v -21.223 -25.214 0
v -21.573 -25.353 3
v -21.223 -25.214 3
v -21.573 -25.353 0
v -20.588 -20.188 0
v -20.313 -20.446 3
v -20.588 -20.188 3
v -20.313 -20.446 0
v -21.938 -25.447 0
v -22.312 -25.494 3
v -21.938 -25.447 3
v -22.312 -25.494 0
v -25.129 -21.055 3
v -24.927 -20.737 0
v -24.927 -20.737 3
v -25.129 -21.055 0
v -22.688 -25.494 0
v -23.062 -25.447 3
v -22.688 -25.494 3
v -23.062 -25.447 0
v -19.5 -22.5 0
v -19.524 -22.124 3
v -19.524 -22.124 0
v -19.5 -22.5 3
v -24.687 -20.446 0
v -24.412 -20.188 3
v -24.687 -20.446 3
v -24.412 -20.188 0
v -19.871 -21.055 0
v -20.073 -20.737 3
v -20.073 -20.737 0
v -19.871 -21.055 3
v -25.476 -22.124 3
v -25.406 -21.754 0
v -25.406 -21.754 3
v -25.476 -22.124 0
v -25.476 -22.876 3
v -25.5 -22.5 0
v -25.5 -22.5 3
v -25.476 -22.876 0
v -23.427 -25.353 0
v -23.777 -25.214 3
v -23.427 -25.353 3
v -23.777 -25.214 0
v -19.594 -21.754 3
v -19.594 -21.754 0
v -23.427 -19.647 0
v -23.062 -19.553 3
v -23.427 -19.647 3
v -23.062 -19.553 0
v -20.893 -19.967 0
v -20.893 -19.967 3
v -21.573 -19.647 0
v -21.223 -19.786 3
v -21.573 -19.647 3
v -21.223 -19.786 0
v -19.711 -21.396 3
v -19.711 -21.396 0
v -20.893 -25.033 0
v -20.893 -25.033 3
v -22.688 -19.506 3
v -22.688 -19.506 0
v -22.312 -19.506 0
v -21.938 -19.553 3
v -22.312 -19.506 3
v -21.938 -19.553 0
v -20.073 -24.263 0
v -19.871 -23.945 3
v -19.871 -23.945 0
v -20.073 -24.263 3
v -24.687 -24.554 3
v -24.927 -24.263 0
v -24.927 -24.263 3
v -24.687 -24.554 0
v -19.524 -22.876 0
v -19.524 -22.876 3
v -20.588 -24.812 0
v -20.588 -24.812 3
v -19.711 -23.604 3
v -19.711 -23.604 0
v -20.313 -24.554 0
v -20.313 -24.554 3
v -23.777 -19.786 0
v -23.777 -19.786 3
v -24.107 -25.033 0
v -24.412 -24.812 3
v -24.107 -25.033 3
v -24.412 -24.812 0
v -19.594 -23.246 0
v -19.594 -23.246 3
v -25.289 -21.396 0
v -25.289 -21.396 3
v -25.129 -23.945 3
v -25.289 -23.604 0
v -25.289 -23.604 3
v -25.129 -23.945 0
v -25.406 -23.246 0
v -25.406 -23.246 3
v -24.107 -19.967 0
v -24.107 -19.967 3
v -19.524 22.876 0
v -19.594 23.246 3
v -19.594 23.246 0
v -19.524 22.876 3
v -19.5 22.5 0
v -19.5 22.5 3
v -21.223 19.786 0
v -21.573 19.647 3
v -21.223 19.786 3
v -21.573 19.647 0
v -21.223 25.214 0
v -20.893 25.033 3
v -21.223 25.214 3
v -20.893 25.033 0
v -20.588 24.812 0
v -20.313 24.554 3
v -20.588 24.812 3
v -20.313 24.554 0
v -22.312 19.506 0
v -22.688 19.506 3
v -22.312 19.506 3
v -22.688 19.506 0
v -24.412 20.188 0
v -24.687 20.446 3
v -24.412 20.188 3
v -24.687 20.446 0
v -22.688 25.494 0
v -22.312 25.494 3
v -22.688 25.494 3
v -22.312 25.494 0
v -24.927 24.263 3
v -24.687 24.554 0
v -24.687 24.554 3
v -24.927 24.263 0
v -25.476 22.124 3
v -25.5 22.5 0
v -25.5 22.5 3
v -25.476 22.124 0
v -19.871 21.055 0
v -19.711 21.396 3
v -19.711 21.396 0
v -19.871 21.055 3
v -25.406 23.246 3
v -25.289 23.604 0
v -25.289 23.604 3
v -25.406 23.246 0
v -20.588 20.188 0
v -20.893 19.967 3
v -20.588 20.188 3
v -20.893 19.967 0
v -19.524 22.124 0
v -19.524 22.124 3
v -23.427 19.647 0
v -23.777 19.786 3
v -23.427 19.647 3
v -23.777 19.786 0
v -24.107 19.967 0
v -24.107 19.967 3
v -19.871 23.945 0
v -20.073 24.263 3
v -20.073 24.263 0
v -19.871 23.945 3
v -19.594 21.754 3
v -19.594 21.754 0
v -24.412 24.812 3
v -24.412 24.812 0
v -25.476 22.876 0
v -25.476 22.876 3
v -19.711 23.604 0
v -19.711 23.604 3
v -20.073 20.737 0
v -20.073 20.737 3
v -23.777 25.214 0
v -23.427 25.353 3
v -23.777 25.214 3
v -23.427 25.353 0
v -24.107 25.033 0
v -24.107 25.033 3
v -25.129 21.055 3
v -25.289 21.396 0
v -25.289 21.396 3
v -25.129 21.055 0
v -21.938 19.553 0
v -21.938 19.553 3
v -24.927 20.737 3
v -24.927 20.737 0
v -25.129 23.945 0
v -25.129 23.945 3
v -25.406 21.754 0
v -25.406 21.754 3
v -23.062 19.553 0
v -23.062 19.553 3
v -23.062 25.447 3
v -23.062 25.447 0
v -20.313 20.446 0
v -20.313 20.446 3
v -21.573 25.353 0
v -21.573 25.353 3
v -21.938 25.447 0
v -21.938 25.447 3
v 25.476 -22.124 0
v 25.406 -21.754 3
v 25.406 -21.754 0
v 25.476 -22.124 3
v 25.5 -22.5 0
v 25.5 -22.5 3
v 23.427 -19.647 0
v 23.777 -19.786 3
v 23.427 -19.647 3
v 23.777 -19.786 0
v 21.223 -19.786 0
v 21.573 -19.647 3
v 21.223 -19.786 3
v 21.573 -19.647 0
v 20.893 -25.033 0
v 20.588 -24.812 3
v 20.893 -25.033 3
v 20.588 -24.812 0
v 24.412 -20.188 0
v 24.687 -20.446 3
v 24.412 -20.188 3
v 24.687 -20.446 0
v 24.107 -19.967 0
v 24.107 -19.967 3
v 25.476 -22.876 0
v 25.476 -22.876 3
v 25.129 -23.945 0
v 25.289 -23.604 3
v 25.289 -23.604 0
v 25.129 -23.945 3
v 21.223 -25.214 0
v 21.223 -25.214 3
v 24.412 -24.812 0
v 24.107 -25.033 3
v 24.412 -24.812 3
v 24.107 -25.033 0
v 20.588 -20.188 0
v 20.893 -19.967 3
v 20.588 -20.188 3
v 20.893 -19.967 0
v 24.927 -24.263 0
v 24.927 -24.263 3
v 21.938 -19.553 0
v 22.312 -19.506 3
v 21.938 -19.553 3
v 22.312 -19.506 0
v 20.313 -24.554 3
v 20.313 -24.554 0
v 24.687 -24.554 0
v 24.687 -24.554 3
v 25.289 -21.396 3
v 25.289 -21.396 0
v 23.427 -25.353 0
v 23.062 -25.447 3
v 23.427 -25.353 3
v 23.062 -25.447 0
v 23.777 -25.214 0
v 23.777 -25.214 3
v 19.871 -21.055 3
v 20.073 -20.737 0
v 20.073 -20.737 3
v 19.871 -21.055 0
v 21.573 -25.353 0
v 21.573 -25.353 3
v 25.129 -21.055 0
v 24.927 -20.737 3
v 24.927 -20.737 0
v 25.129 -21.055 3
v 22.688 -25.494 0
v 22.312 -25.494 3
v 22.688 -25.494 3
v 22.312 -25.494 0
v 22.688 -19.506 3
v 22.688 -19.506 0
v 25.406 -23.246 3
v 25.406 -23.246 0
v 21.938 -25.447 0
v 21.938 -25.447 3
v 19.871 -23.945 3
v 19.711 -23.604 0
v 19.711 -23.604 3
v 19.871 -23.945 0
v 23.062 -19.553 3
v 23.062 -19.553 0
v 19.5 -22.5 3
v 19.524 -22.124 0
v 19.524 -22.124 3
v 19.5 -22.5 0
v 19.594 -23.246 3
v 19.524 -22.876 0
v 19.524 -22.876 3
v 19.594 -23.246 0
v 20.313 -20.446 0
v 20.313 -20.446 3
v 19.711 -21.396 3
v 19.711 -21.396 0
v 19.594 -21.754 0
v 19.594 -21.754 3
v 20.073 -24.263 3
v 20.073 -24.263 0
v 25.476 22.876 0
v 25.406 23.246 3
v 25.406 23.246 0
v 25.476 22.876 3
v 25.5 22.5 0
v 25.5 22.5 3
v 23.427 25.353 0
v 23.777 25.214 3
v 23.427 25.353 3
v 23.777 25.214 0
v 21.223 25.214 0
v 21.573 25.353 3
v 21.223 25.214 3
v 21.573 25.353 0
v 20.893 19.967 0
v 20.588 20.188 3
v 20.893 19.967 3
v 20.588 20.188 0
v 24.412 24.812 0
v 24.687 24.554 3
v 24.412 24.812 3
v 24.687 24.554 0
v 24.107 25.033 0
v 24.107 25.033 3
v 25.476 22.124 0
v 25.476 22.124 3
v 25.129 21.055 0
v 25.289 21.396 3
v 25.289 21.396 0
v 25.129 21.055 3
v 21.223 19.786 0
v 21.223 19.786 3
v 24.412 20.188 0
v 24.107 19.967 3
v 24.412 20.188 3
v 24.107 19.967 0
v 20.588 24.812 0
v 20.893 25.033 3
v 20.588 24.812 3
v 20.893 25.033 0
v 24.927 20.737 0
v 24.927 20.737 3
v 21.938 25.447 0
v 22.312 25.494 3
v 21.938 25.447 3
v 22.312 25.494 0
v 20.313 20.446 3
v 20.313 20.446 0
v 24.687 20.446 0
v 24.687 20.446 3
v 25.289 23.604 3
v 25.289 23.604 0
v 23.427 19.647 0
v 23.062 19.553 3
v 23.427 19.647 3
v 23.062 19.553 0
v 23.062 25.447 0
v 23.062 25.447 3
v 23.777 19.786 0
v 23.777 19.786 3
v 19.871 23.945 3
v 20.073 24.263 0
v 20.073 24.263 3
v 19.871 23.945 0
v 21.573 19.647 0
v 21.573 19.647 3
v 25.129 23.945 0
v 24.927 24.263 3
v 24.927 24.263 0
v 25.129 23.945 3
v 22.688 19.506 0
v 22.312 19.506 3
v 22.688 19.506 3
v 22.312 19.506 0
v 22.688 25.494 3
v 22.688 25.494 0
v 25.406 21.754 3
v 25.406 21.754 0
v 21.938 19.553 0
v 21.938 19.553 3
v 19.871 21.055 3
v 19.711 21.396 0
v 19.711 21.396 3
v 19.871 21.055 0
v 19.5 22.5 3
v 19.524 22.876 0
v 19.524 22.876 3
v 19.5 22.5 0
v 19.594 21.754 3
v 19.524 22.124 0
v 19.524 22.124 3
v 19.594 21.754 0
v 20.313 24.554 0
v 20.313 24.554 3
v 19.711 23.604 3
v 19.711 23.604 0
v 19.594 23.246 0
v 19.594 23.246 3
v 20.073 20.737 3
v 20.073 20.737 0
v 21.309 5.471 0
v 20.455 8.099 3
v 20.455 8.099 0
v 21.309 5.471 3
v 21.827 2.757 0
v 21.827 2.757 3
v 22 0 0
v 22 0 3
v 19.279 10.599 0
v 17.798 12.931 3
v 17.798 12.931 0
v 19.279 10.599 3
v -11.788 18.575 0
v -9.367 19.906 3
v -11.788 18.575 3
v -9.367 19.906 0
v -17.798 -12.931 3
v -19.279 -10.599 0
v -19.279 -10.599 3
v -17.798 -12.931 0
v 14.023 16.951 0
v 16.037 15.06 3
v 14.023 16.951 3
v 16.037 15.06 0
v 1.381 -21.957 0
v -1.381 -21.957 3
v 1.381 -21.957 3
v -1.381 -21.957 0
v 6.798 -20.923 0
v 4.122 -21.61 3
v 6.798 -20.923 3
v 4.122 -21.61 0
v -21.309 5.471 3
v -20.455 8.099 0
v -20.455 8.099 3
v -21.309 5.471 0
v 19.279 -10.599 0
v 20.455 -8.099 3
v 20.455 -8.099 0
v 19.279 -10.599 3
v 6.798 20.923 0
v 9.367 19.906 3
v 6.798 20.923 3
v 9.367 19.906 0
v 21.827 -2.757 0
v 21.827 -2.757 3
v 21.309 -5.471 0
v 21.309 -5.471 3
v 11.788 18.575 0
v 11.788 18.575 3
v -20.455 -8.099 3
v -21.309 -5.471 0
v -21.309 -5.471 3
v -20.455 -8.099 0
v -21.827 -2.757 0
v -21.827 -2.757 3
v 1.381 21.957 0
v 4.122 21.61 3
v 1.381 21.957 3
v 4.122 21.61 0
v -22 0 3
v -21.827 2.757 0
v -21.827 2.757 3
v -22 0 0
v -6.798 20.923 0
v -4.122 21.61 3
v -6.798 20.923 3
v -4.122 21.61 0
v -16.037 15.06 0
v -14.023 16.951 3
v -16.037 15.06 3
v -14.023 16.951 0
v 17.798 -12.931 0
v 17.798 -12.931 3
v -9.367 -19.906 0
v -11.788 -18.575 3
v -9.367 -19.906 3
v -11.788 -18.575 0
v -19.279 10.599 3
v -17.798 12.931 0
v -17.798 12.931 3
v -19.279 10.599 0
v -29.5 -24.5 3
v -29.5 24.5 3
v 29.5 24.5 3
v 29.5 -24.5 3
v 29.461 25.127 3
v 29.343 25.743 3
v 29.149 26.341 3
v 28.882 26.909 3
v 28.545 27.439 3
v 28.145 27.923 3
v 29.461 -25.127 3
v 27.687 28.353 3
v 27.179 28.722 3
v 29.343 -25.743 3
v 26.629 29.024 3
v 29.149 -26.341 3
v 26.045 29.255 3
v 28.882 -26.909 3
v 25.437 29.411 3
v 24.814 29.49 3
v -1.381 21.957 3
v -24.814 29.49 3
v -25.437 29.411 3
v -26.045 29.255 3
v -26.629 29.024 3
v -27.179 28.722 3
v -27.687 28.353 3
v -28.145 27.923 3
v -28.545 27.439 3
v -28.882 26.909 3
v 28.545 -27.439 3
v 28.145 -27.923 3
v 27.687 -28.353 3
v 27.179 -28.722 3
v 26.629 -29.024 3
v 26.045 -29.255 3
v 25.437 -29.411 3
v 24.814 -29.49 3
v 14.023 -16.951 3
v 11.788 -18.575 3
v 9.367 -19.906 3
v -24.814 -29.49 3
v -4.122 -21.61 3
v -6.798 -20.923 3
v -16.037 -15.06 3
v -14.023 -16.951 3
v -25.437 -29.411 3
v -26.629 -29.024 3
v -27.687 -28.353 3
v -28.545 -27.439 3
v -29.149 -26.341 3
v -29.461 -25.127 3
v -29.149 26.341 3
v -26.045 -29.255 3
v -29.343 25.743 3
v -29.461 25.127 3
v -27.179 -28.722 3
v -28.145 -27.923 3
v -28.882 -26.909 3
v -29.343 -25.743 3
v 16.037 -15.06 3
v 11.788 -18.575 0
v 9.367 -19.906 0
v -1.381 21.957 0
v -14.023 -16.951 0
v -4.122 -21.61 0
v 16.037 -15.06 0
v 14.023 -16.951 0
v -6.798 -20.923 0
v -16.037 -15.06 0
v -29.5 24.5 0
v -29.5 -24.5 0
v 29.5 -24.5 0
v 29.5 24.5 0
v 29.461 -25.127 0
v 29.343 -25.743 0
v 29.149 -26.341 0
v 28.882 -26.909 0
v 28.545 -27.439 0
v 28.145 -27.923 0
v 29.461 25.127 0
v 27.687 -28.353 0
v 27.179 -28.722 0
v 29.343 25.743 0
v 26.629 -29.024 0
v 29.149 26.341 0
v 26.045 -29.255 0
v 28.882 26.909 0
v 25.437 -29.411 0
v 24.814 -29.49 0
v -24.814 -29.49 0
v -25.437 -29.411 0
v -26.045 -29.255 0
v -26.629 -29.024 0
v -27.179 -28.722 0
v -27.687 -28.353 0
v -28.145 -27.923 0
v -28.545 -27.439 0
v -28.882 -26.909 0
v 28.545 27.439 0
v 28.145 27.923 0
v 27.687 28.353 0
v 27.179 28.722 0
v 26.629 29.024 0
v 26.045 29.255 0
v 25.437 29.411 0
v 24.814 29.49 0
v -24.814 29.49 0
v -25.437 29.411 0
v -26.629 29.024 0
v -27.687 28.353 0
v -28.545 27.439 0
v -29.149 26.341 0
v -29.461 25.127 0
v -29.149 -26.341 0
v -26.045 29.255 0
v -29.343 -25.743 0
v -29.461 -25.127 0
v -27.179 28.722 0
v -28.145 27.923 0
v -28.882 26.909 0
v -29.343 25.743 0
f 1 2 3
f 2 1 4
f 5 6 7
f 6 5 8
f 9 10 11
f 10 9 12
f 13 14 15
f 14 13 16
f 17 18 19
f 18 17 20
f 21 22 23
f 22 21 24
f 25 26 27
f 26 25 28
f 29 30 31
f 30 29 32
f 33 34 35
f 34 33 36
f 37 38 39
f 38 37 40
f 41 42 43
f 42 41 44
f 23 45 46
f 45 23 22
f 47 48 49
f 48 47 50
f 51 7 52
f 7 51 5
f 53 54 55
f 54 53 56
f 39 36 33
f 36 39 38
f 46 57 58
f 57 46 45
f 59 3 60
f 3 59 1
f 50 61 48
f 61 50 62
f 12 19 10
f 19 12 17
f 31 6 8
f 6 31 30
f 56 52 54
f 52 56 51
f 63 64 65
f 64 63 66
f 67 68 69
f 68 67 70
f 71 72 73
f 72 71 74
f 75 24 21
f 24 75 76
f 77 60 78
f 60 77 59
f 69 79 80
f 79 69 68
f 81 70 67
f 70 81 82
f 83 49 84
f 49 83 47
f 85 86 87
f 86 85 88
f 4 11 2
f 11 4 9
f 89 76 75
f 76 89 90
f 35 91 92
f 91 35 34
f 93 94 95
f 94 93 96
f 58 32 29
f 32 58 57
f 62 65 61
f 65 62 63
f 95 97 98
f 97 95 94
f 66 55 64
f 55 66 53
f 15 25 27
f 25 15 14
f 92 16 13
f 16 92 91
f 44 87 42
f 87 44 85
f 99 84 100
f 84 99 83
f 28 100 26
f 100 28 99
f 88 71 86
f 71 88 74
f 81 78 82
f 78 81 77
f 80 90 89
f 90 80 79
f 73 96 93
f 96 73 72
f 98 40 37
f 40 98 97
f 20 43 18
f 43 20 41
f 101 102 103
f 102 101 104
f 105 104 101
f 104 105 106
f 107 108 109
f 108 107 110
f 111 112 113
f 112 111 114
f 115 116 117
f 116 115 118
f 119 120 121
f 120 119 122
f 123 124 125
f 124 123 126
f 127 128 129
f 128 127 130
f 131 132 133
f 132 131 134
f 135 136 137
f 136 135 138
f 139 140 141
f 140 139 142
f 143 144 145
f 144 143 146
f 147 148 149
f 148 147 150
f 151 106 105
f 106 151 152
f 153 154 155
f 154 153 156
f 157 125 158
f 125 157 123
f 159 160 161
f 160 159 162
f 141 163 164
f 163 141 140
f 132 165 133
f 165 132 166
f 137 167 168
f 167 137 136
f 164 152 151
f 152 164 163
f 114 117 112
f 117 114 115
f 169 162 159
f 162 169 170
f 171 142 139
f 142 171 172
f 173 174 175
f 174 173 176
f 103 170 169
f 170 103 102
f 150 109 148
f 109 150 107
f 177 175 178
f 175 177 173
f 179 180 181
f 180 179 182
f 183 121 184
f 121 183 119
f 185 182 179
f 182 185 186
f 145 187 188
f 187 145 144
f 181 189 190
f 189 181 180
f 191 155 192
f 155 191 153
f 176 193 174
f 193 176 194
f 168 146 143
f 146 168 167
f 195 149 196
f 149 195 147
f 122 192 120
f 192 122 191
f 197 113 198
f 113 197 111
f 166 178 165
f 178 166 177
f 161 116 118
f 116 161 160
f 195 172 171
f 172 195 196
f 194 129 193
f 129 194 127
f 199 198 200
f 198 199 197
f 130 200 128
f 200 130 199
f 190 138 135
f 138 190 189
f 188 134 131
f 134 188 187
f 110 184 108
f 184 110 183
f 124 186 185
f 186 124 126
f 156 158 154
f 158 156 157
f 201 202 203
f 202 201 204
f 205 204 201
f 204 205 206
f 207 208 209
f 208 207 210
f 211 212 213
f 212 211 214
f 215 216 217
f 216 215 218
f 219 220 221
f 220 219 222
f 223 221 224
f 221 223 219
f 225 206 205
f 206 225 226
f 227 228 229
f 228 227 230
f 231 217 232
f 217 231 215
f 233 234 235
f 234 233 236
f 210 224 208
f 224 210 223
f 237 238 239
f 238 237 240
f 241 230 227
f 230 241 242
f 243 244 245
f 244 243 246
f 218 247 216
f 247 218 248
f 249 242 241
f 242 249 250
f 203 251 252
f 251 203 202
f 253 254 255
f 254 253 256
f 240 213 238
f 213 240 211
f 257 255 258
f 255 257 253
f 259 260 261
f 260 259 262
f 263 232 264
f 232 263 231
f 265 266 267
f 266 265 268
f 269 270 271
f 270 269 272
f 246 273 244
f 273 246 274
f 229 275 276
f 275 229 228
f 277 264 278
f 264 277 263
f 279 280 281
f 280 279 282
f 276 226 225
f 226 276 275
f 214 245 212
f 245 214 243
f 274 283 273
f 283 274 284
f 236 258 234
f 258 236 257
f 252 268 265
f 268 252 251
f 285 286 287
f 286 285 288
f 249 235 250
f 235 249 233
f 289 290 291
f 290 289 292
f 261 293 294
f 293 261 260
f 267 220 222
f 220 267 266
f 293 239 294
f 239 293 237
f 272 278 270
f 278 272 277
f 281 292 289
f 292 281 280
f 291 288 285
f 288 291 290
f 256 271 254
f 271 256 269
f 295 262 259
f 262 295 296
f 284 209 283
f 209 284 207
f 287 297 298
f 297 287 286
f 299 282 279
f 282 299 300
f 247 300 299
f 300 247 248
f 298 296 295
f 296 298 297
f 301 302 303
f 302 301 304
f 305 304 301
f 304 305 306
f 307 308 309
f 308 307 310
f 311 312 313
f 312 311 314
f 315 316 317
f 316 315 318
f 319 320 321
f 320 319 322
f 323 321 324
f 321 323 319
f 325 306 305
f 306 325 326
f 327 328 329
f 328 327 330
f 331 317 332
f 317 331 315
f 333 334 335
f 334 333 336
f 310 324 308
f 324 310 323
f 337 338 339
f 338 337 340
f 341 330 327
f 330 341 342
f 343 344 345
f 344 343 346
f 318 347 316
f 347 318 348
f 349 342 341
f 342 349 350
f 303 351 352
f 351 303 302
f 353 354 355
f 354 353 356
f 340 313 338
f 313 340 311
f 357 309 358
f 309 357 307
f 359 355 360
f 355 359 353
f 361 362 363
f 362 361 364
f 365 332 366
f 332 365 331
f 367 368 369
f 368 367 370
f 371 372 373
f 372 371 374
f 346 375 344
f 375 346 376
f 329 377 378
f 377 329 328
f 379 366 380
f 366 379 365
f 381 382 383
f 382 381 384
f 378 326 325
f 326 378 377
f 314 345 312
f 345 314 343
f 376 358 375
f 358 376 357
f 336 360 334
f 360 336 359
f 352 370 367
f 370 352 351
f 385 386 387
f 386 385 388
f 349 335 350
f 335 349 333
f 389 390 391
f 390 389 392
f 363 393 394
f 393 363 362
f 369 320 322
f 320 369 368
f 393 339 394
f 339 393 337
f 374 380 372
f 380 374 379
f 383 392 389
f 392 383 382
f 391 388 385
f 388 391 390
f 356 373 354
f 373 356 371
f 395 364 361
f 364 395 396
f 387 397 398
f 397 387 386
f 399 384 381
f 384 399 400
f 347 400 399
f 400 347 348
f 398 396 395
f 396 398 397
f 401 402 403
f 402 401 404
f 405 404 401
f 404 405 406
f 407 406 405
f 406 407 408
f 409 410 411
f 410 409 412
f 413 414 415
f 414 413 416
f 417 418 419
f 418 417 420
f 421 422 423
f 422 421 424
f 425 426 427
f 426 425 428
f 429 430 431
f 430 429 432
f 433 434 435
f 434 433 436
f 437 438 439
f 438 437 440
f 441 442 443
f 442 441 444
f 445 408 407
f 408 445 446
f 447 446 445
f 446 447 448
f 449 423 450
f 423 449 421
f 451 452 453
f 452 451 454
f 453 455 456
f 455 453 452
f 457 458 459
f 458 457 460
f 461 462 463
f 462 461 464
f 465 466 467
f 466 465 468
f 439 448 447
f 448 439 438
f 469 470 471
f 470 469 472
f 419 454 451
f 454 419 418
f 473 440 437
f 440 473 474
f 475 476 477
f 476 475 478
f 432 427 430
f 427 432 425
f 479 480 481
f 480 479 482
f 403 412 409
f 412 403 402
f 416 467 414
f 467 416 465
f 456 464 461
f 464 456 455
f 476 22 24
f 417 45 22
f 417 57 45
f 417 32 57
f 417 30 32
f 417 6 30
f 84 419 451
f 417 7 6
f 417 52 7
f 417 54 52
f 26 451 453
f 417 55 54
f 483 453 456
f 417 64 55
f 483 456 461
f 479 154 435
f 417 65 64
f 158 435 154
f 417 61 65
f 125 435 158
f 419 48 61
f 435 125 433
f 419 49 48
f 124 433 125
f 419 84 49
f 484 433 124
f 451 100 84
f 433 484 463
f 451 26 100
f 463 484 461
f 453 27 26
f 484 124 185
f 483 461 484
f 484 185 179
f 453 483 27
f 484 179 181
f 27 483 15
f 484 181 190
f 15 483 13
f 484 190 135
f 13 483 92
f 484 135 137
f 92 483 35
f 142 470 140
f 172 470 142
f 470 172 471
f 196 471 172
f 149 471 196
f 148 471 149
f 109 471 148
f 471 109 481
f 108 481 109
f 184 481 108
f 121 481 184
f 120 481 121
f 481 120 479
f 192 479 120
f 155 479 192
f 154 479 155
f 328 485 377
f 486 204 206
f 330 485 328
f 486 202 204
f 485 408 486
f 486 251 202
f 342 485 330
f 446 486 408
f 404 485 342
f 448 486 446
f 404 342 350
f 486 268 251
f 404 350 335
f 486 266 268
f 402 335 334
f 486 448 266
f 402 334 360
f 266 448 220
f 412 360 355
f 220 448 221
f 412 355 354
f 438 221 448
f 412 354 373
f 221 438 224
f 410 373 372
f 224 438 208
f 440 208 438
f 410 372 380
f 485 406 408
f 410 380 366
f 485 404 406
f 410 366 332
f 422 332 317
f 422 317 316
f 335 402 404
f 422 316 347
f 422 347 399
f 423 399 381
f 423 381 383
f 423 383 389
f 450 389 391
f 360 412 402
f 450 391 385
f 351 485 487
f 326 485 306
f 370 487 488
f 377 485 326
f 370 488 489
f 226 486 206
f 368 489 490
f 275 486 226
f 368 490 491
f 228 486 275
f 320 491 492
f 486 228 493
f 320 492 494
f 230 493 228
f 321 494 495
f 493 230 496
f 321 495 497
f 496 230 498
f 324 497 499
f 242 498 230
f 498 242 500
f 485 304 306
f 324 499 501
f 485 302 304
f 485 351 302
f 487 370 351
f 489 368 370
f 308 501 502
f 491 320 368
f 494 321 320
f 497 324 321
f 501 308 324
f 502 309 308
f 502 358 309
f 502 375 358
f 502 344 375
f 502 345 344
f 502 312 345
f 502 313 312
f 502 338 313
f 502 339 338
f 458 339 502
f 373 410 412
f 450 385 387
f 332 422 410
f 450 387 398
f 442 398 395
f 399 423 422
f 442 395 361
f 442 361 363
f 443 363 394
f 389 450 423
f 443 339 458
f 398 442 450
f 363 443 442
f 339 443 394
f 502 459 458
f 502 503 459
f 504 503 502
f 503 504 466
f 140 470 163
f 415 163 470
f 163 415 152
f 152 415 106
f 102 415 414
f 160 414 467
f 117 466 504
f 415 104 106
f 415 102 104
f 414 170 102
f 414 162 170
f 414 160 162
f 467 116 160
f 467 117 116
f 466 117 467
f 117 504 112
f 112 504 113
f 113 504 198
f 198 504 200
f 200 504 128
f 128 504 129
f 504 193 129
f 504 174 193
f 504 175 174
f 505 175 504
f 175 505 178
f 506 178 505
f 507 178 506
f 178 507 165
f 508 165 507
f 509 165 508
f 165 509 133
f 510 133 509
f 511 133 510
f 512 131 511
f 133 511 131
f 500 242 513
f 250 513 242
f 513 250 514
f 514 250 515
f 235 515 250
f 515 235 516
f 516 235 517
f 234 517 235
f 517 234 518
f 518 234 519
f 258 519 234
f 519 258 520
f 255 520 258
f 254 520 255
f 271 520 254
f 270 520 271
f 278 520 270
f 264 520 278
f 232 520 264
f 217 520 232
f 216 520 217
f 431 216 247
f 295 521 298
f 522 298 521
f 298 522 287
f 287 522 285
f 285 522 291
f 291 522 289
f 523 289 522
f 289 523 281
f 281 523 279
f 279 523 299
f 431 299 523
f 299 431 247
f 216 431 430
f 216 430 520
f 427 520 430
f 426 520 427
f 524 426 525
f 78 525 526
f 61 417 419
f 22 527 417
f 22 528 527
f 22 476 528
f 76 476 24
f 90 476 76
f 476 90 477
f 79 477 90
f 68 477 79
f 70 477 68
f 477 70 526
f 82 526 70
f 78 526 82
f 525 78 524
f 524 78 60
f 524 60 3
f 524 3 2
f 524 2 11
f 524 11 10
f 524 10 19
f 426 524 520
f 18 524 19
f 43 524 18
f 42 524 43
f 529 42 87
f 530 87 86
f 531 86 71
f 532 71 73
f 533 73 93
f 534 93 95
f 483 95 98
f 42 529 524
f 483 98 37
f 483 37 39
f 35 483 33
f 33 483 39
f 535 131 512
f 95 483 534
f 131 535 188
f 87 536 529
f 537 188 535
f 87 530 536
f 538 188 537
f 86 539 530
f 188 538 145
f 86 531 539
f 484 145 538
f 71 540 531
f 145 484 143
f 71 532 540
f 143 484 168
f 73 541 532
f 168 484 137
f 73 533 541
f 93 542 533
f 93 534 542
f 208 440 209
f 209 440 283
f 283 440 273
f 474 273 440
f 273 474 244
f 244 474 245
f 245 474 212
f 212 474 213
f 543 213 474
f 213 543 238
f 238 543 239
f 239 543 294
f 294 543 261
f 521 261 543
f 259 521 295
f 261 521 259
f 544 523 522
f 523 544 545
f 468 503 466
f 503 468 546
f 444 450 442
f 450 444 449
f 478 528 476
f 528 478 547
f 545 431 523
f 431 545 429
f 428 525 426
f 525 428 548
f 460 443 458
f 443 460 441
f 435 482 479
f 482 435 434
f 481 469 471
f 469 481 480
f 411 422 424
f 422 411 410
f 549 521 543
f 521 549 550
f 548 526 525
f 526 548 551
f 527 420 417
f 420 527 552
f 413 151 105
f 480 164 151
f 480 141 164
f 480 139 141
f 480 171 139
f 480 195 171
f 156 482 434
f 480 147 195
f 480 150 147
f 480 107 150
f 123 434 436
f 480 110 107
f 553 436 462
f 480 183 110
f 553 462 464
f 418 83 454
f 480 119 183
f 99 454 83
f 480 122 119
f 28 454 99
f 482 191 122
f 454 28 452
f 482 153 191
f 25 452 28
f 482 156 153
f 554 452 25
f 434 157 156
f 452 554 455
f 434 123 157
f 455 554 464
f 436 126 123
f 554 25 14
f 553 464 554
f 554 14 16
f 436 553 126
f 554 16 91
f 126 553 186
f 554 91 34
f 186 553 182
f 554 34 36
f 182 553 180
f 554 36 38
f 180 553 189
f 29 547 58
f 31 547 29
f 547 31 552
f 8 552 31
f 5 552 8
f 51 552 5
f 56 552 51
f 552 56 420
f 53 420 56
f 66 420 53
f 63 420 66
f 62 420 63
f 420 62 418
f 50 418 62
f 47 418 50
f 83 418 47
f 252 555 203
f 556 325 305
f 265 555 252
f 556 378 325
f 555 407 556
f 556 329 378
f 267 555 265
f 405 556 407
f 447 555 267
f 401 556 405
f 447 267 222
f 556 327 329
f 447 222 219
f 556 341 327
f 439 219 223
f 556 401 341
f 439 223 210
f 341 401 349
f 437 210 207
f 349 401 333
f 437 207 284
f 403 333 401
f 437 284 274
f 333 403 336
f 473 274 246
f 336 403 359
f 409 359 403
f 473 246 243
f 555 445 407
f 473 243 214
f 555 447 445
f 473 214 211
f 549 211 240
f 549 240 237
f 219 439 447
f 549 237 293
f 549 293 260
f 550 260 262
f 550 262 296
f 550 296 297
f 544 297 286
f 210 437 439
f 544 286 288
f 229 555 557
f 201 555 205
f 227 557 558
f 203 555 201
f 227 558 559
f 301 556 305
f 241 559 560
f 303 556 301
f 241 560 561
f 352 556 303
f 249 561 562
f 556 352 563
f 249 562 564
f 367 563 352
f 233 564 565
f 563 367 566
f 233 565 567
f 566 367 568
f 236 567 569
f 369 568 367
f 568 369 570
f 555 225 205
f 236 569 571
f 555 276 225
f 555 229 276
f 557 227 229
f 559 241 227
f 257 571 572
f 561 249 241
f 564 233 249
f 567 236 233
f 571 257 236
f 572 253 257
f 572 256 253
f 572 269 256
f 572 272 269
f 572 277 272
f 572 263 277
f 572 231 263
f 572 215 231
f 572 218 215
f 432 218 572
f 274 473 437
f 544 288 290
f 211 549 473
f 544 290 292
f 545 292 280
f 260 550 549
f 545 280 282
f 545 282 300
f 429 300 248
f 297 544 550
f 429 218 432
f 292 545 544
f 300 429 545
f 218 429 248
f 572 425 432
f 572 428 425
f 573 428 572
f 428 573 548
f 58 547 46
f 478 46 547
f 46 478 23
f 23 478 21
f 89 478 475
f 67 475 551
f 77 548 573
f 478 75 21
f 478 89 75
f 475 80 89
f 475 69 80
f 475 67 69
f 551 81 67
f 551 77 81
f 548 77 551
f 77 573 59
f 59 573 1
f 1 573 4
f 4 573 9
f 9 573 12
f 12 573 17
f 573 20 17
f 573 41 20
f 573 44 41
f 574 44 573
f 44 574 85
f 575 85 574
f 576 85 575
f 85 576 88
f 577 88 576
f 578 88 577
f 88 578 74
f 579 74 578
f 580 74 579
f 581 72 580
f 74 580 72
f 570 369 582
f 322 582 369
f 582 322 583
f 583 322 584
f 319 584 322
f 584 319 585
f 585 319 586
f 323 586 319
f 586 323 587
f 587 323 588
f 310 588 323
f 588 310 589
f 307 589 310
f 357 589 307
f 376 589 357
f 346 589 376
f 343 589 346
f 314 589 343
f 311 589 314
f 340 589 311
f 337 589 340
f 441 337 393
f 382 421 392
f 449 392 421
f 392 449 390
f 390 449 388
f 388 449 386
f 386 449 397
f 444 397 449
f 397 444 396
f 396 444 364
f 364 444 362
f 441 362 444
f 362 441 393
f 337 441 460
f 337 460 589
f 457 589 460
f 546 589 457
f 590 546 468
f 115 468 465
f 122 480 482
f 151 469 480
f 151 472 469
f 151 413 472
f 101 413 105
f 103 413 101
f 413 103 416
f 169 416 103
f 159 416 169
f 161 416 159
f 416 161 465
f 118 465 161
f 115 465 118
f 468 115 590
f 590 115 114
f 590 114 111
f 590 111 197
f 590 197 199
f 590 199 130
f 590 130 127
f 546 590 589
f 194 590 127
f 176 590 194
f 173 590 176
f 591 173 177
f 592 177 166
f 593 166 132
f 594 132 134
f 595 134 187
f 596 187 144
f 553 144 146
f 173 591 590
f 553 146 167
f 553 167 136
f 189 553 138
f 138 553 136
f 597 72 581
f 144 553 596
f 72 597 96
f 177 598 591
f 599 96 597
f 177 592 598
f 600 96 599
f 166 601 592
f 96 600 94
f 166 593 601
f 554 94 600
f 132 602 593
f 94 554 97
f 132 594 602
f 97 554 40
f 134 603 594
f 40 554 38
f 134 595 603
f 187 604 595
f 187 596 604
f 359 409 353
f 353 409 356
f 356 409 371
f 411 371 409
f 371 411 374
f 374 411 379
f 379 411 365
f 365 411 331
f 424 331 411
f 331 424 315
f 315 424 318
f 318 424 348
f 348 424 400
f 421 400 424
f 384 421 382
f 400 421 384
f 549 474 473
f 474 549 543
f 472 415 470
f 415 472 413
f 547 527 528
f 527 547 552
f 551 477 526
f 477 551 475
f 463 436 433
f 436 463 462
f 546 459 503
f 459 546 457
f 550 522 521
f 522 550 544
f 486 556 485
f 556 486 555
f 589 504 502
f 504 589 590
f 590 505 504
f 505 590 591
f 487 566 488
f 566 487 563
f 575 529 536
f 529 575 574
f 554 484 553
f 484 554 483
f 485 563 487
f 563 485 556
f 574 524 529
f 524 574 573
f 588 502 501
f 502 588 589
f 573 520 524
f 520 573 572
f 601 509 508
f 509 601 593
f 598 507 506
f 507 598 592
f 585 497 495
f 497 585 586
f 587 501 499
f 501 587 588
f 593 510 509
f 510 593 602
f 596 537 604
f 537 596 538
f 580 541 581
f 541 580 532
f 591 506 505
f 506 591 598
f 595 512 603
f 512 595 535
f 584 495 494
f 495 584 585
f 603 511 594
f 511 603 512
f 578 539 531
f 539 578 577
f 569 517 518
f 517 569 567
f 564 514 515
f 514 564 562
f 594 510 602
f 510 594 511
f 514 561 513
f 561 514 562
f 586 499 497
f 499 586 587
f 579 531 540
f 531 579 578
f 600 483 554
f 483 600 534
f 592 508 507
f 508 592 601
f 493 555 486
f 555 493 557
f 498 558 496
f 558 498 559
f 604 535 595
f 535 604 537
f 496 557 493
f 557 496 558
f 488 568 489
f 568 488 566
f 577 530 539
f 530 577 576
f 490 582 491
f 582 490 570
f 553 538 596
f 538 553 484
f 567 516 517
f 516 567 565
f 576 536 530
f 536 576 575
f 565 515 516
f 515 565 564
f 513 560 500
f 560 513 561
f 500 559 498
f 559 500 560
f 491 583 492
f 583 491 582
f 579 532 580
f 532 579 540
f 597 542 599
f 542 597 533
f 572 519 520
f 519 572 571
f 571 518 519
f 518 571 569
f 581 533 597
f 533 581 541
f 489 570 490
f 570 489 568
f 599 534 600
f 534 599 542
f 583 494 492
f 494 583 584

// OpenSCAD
$fn = 50;


difference() {
	union() {
		hull() {
			translate(v = [-24.5000000000, 24.5000000000, 0]) {
				cylinder(h = 3, r = 5);
			}
			translate(v = [24.5000000000, 24.5000000000, 0]) {
				cylinder(h = 3, r = 5);
			}
			translate(v = [-24.5000000000, -24.5000000000, 0]) {
				cylinder(h = 3, r = 5);
			}
			translate(v = [24.5000000000, -24.5000000000, 0]) {
				cylinder(h = 3, r = 5);
			}
		}
	}
	union() {
		#translate(v = [-22.5000000000, -22.5000000000, -100.0000000000]) {
			cylinder(h = 200, r = 3.0000000000);
		}
		#translate(v = [-22.5000000000, 22.5000000000, -100.0000000000]) {
			cylinder(h = 200, r = 3.0000000000);
		}
		#translate(v = [22.5000000000, -22.5000000000, -100.0000000000]) {
			cylinder(h = 200, r = 3.0000000000);
		}
		#translate(v = [22.5000000000, 22.5000000000, -100.0000000000]) {
			cylinder(h = 200, r = 3.0000000000);
		}
		#cylinder(h = 3, r = 22.0000000000);
	}
}
